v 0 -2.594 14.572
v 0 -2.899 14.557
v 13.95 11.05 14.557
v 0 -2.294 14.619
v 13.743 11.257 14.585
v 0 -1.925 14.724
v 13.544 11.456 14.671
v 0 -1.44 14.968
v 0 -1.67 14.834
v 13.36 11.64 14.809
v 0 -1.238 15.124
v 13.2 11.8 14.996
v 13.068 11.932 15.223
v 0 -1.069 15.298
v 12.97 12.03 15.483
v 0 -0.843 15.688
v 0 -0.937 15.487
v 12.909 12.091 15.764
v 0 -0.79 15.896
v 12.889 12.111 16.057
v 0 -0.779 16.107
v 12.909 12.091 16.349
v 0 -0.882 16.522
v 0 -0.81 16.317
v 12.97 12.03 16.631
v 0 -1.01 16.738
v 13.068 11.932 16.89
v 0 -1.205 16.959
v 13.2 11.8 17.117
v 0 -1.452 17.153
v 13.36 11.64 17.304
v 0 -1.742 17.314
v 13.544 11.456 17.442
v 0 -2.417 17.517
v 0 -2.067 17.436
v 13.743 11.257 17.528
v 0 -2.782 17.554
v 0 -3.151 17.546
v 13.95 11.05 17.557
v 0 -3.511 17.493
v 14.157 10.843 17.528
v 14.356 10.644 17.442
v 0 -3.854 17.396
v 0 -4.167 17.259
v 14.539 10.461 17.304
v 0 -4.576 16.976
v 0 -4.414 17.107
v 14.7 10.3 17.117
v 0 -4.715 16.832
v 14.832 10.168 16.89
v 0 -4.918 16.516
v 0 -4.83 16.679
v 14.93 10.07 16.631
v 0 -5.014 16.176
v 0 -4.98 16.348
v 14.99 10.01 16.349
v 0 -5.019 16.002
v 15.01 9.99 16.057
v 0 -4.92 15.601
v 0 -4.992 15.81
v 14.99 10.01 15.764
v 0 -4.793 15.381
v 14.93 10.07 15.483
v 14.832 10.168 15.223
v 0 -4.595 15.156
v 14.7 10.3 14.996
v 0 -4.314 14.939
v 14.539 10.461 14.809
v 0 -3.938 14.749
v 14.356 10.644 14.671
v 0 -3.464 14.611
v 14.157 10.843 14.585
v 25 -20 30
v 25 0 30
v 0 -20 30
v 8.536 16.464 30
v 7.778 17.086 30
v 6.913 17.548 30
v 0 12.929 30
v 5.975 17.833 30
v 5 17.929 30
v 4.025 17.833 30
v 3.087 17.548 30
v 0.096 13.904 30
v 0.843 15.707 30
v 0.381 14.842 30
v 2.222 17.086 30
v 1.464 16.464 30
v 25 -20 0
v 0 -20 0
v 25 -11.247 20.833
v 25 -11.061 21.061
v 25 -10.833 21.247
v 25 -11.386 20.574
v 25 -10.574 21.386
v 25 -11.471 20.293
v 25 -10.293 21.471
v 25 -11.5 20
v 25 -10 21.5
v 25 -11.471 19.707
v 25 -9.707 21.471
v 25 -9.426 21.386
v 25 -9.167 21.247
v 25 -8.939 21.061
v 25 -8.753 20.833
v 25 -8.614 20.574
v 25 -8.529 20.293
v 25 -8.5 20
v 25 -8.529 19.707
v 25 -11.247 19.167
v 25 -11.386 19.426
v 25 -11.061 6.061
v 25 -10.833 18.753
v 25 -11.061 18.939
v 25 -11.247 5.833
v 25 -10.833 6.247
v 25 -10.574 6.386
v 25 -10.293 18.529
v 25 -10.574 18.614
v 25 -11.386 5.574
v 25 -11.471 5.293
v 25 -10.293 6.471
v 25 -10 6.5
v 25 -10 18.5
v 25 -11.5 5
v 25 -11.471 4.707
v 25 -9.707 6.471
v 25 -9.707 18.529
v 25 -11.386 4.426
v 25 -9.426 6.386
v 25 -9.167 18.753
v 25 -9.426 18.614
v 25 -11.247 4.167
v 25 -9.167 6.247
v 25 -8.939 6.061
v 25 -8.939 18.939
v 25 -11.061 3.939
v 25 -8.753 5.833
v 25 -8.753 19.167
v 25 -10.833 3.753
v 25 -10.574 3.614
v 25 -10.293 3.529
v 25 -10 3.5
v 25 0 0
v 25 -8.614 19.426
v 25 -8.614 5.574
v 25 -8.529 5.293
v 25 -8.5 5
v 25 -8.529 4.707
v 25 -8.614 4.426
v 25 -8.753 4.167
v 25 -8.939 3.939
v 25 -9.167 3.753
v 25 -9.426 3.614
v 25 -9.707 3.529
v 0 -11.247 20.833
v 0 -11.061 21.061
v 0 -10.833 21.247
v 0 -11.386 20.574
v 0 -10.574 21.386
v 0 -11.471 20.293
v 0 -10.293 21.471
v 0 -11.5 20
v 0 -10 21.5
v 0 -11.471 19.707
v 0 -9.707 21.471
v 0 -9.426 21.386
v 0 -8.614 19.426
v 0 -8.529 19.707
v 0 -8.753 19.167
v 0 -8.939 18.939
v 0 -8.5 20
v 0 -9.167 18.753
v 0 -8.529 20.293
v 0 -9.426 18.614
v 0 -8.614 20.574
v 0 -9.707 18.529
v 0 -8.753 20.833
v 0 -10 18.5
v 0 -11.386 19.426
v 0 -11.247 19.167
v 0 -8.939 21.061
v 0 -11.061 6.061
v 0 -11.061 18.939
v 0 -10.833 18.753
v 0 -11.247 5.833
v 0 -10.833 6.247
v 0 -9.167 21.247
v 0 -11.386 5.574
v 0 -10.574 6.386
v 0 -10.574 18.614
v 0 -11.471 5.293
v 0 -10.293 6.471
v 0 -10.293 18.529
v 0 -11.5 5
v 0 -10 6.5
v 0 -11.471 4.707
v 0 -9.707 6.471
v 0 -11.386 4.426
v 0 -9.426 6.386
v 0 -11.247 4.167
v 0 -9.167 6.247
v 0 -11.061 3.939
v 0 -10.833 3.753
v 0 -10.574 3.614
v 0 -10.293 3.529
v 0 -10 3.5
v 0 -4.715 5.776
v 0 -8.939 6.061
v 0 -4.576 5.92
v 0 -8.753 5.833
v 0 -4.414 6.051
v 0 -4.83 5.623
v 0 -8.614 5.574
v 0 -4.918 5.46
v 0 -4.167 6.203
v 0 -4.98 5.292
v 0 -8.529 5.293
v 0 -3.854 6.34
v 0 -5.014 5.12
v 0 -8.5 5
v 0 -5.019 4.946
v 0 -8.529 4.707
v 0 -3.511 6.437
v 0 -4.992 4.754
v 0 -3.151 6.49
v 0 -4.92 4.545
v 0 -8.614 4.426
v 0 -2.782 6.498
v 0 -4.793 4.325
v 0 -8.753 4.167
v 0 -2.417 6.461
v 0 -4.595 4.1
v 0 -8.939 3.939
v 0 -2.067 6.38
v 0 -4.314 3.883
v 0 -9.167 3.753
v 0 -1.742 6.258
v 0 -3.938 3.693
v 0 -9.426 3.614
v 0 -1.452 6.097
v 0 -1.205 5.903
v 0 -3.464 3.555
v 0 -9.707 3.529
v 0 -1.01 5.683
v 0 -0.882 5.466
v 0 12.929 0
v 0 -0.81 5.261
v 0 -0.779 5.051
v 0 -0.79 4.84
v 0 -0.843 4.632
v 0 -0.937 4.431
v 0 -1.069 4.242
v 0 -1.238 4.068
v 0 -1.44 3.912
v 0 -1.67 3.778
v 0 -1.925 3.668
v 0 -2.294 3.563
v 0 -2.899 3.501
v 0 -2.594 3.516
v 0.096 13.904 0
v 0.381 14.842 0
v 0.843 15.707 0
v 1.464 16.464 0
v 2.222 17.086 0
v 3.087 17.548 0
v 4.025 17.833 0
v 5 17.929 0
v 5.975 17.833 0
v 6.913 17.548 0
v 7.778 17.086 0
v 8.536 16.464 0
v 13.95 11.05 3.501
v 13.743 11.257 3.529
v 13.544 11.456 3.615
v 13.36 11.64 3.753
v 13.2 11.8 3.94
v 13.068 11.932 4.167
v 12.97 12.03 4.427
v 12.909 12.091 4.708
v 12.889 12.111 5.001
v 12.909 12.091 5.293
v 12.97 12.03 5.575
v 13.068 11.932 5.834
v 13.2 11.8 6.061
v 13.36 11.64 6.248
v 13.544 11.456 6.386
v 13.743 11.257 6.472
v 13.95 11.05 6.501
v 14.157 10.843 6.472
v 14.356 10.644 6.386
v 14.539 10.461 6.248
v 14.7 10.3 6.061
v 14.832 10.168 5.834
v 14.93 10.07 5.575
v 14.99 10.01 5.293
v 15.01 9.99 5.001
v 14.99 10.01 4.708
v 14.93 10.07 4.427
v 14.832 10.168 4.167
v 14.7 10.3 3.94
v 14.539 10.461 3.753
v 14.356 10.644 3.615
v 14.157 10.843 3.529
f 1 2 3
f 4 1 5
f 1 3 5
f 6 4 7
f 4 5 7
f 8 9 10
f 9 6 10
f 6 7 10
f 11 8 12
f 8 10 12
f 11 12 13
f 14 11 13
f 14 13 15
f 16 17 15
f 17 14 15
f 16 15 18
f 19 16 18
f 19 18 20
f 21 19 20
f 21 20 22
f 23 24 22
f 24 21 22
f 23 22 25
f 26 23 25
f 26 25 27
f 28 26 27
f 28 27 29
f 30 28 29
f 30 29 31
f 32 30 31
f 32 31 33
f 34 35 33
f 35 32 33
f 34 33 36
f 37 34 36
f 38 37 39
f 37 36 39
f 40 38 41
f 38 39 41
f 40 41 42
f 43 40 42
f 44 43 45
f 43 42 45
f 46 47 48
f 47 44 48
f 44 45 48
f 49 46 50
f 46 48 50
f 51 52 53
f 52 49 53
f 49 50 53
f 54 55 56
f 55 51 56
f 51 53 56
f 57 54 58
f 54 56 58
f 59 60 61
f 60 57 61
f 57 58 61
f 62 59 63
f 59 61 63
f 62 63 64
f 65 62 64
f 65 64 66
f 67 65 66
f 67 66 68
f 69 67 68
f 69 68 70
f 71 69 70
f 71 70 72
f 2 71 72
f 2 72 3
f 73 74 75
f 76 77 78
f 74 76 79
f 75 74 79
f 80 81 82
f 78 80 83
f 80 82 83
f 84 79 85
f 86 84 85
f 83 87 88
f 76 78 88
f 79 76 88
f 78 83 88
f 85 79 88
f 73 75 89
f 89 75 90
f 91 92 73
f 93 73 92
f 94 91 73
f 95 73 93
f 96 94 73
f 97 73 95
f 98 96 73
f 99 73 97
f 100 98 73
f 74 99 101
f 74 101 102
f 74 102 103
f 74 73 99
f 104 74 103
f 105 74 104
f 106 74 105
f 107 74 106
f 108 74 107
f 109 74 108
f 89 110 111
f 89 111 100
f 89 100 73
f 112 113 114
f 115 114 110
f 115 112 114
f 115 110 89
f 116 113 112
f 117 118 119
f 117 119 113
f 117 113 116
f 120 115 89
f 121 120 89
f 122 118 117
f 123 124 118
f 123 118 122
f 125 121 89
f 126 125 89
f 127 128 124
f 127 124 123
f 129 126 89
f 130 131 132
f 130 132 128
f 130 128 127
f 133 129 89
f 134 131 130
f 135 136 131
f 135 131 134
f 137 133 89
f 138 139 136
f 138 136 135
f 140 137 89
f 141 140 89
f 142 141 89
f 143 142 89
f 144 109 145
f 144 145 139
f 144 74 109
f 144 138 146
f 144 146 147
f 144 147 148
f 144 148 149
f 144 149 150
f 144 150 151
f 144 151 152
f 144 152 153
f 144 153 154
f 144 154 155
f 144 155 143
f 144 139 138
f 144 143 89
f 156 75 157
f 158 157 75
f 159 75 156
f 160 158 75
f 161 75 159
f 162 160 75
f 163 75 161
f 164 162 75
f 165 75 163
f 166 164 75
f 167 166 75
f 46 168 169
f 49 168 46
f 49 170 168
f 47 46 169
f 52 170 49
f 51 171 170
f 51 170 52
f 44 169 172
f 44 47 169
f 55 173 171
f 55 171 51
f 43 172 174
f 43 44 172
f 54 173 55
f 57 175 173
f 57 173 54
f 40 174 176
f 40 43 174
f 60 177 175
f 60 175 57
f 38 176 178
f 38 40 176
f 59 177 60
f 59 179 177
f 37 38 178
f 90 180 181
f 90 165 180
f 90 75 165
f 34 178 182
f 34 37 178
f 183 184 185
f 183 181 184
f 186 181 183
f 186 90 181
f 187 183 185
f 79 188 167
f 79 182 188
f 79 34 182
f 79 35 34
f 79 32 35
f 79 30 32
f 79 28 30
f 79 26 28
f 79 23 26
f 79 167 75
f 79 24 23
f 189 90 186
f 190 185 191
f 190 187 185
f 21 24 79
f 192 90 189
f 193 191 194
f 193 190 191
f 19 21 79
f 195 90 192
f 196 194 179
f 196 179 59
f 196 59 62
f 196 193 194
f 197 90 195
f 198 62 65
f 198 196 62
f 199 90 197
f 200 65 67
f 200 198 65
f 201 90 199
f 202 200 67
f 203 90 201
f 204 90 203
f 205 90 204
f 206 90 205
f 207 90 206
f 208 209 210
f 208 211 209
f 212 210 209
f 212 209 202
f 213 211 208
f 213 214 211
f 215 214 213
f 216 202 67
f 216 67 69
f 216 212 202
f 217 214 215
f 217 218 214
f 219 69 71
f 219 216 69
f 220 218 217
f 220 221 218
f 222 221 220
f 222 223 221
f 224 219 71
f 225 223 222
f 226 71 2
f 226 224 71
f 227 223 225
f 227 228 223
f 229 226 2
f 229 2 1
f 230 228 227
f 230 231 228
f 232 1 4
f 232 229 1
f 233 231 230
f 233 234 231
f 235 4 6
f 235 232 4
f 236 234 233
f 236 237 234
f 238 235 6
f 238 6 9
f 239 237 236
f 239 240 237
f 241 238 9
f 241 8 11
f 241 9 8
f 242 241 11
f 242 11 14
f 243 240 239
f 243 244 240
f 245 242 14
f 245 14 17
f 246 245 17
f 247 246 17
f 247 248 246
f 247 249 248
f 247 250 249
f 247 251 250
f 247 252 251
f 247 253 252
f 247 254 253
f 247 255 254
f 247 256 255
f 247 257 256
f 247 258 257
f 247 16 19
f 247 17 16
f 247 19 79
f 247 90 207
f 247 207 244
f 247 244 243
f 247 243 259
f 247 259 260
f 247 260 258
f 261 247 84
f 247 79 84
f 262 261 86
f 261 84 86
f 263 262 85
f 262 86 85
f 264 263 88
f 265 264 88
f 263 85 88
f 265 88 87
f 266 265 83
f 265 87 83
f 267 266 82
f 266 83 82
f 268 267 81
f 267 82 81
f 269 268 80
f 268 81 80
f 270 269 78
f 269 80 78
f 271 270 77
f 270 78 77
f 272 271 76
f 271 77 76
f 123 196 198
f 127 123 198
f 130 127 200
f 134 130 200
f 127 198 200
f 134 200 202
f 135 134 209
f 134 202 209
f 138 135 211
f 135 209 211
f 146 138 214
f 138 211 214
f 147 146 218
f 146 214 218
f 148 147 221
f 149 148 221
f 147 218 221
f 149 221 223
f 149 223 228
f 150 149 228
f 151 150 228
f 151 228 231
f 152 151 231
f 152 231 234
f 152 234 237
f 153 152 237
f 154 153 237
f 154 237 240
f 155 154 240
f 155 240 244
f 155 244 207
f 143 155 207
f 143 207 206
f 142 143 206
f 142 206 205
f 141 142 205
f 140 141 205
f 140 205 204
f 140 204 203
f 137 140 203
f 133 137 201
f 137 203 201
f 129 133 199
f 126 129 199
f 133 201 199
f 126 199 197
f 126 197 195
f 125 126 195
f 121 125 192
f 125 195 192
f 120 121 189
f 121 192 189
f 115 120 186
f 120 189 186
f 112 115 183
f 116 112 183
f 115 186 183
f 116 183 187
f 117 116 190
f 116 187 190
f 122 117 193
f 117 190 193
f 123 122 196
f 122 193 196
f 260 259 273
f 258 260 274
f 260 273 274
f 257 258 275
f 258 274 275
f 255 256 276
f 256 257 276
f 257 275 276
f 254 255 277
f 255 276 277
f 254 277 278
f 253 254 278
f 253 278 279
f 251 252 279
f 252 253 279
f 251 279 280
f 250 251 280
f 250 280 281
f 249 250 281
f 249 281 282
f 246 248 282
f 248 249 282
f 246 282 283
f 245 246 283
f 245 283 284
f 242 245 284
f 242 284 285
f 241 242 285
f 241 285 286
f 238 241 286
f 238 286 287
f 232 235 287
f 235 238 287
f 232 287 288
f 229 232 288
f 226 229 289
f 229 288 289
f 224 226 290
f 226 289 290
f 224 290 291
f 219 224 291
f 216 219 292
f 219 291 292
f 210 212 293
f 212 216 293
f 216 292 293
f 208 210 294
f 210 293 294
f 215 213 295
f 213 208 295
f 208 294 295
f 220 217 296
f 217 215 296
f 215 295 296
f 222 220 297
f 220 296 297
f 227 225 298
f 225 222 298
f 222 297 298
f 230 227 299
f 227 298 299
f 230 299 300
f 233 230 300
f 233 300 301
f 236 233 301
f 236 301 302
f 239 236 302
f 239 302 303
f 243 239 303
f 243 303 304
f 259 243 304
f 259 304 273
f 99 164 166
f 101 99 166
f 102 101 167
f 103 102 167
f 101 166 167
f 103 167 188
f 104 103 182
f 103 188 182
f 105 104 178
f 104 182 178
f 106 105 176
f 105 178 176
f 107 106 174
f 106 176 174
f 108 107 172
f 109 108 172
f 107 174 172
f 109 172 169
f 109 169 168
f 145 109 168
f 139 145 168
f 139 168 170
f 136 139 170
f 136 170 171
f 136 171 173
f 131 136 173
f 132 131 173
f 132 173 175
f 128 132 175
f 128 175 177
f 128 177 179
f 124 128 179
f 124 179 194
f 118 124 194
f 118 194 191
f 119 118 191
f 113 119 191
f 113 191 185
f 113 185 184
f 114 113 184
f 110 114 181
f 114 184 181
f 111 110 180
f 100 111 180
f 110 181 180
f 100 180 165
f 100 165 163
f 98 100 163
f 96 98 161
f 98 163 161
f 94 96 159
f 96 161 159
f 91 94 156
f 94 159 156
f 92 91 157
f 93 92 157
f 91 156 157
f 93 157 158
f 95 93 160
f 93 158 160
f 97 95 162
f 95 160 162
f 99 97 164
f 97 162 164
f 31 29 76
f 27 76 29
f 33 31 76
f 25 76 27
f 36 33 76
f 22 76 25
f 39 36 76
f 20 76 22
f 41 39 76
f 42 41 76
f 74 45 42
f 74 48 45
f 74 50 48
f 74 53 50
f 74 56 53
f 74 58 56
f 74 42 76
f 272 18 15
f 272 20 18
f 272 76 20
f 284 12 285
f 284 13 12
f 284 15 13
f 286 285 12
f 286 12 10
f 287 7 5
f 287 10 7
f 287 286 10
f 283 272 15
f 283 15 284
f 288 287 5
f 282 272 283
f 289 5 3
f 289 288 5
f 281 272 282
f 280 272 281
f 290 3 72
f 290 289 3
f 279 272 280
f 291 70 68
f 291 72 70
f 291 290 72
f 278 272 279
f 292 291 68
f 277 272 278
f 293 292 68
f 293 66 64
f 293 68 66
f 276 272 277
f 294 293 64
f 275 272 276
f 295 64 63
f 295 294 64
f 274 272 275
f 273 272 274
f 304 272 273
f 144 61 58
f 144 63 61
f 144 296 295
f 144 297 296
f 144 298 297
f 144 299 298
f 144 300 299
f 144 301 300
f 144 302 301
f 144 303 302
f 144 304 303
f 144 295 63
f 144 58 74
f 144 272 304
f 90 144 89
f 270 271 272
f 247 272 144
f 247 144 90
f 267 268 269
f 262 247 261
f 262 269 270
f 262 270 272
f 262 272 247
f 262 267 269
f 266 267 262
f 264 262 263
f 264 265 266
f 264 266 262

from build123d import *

# Parameters (mm, degrees)
CROQUIS2_W              = 30
CROQUIS2_H              = 20
SALIENTE_EXTRUIR2_DEPTH = 25
SALIENTE_EXTRUIR3_DEPTH = 30
REDONDEO1_R             = 5
CROQUIS8_R              = 1.5
CORTAR_EXTRUIR5_DEPTH   = 26
CROQUIS9_R              = 1.5
CORTAR_EXTRUIR6_DEPTH   = 32.819805153


with BuildPart() as part:
    # Croquis2 → Saliente-Extruir2 (new body)
    with BuildSketch(Plane(origin=(0, 0, 0), x_dir=(0, 0, -1), z_dir=(1, 0, 0))):
        with Locations((-15, -10)):
            Rectangle(CROQUIS2_W, CROQUIS2_H)
    extrude(amount=SALIENTE_EXTRUIR2_DEPTH)

    # Croquis3 → Saliente-Extruir3 (add, through all)
    with BuildSketch(Plane(origin=(0, 0, 0), x_dir=(-1, 0, 0), z_dir=(0, 0, -1))):
        Polygon((0, 0), (0, 25), (-25, 0), align=None)
    extrude(amount=-SALIENTE_EXTRUIR3_DEPTH)

    # Redondeo1
    redondeo1_edges = [part.edges().sort_by_distance(p)[0] for p in [
        (0, 25, 15),
    ]]
    fillet(redondeo1_edges, radius=REDONDEO1_R)

    # Croquis8 → Cortar-Extruir5 (cut, through all)
    with BuildSketch(Plane.ZY):
        with Locations((20, -10)):
            Circle(CROQUIS8_R)
        with Locations((5, -10)):
            Circle(CROQUIS8_R)
    extrude(amount=-CORTAR_EXTRUIR5_DEPTH, mode=Mode.SUBTRACT)

    # Croquis9 → Cortar-Extruir6 (cut, through all)
    with BuildSketch(Plane(origin=(12.5, 12.5, 0), x_dir=(0, 0, -1), z_dir=(0.707106781, 0.707106781, 0))):
        with Locations((-16.056627864, -2.050053866)):
            Circle(CROQUIS9_R)
        with Locations((-5.000664805, -2.050053866)):
            Circle(CROQUIS9_R)
    extrude(amount=-CORTAR_EXTRUIR6_DEPTH, mode=Mode.SUBTRACT)


solid = part.part
